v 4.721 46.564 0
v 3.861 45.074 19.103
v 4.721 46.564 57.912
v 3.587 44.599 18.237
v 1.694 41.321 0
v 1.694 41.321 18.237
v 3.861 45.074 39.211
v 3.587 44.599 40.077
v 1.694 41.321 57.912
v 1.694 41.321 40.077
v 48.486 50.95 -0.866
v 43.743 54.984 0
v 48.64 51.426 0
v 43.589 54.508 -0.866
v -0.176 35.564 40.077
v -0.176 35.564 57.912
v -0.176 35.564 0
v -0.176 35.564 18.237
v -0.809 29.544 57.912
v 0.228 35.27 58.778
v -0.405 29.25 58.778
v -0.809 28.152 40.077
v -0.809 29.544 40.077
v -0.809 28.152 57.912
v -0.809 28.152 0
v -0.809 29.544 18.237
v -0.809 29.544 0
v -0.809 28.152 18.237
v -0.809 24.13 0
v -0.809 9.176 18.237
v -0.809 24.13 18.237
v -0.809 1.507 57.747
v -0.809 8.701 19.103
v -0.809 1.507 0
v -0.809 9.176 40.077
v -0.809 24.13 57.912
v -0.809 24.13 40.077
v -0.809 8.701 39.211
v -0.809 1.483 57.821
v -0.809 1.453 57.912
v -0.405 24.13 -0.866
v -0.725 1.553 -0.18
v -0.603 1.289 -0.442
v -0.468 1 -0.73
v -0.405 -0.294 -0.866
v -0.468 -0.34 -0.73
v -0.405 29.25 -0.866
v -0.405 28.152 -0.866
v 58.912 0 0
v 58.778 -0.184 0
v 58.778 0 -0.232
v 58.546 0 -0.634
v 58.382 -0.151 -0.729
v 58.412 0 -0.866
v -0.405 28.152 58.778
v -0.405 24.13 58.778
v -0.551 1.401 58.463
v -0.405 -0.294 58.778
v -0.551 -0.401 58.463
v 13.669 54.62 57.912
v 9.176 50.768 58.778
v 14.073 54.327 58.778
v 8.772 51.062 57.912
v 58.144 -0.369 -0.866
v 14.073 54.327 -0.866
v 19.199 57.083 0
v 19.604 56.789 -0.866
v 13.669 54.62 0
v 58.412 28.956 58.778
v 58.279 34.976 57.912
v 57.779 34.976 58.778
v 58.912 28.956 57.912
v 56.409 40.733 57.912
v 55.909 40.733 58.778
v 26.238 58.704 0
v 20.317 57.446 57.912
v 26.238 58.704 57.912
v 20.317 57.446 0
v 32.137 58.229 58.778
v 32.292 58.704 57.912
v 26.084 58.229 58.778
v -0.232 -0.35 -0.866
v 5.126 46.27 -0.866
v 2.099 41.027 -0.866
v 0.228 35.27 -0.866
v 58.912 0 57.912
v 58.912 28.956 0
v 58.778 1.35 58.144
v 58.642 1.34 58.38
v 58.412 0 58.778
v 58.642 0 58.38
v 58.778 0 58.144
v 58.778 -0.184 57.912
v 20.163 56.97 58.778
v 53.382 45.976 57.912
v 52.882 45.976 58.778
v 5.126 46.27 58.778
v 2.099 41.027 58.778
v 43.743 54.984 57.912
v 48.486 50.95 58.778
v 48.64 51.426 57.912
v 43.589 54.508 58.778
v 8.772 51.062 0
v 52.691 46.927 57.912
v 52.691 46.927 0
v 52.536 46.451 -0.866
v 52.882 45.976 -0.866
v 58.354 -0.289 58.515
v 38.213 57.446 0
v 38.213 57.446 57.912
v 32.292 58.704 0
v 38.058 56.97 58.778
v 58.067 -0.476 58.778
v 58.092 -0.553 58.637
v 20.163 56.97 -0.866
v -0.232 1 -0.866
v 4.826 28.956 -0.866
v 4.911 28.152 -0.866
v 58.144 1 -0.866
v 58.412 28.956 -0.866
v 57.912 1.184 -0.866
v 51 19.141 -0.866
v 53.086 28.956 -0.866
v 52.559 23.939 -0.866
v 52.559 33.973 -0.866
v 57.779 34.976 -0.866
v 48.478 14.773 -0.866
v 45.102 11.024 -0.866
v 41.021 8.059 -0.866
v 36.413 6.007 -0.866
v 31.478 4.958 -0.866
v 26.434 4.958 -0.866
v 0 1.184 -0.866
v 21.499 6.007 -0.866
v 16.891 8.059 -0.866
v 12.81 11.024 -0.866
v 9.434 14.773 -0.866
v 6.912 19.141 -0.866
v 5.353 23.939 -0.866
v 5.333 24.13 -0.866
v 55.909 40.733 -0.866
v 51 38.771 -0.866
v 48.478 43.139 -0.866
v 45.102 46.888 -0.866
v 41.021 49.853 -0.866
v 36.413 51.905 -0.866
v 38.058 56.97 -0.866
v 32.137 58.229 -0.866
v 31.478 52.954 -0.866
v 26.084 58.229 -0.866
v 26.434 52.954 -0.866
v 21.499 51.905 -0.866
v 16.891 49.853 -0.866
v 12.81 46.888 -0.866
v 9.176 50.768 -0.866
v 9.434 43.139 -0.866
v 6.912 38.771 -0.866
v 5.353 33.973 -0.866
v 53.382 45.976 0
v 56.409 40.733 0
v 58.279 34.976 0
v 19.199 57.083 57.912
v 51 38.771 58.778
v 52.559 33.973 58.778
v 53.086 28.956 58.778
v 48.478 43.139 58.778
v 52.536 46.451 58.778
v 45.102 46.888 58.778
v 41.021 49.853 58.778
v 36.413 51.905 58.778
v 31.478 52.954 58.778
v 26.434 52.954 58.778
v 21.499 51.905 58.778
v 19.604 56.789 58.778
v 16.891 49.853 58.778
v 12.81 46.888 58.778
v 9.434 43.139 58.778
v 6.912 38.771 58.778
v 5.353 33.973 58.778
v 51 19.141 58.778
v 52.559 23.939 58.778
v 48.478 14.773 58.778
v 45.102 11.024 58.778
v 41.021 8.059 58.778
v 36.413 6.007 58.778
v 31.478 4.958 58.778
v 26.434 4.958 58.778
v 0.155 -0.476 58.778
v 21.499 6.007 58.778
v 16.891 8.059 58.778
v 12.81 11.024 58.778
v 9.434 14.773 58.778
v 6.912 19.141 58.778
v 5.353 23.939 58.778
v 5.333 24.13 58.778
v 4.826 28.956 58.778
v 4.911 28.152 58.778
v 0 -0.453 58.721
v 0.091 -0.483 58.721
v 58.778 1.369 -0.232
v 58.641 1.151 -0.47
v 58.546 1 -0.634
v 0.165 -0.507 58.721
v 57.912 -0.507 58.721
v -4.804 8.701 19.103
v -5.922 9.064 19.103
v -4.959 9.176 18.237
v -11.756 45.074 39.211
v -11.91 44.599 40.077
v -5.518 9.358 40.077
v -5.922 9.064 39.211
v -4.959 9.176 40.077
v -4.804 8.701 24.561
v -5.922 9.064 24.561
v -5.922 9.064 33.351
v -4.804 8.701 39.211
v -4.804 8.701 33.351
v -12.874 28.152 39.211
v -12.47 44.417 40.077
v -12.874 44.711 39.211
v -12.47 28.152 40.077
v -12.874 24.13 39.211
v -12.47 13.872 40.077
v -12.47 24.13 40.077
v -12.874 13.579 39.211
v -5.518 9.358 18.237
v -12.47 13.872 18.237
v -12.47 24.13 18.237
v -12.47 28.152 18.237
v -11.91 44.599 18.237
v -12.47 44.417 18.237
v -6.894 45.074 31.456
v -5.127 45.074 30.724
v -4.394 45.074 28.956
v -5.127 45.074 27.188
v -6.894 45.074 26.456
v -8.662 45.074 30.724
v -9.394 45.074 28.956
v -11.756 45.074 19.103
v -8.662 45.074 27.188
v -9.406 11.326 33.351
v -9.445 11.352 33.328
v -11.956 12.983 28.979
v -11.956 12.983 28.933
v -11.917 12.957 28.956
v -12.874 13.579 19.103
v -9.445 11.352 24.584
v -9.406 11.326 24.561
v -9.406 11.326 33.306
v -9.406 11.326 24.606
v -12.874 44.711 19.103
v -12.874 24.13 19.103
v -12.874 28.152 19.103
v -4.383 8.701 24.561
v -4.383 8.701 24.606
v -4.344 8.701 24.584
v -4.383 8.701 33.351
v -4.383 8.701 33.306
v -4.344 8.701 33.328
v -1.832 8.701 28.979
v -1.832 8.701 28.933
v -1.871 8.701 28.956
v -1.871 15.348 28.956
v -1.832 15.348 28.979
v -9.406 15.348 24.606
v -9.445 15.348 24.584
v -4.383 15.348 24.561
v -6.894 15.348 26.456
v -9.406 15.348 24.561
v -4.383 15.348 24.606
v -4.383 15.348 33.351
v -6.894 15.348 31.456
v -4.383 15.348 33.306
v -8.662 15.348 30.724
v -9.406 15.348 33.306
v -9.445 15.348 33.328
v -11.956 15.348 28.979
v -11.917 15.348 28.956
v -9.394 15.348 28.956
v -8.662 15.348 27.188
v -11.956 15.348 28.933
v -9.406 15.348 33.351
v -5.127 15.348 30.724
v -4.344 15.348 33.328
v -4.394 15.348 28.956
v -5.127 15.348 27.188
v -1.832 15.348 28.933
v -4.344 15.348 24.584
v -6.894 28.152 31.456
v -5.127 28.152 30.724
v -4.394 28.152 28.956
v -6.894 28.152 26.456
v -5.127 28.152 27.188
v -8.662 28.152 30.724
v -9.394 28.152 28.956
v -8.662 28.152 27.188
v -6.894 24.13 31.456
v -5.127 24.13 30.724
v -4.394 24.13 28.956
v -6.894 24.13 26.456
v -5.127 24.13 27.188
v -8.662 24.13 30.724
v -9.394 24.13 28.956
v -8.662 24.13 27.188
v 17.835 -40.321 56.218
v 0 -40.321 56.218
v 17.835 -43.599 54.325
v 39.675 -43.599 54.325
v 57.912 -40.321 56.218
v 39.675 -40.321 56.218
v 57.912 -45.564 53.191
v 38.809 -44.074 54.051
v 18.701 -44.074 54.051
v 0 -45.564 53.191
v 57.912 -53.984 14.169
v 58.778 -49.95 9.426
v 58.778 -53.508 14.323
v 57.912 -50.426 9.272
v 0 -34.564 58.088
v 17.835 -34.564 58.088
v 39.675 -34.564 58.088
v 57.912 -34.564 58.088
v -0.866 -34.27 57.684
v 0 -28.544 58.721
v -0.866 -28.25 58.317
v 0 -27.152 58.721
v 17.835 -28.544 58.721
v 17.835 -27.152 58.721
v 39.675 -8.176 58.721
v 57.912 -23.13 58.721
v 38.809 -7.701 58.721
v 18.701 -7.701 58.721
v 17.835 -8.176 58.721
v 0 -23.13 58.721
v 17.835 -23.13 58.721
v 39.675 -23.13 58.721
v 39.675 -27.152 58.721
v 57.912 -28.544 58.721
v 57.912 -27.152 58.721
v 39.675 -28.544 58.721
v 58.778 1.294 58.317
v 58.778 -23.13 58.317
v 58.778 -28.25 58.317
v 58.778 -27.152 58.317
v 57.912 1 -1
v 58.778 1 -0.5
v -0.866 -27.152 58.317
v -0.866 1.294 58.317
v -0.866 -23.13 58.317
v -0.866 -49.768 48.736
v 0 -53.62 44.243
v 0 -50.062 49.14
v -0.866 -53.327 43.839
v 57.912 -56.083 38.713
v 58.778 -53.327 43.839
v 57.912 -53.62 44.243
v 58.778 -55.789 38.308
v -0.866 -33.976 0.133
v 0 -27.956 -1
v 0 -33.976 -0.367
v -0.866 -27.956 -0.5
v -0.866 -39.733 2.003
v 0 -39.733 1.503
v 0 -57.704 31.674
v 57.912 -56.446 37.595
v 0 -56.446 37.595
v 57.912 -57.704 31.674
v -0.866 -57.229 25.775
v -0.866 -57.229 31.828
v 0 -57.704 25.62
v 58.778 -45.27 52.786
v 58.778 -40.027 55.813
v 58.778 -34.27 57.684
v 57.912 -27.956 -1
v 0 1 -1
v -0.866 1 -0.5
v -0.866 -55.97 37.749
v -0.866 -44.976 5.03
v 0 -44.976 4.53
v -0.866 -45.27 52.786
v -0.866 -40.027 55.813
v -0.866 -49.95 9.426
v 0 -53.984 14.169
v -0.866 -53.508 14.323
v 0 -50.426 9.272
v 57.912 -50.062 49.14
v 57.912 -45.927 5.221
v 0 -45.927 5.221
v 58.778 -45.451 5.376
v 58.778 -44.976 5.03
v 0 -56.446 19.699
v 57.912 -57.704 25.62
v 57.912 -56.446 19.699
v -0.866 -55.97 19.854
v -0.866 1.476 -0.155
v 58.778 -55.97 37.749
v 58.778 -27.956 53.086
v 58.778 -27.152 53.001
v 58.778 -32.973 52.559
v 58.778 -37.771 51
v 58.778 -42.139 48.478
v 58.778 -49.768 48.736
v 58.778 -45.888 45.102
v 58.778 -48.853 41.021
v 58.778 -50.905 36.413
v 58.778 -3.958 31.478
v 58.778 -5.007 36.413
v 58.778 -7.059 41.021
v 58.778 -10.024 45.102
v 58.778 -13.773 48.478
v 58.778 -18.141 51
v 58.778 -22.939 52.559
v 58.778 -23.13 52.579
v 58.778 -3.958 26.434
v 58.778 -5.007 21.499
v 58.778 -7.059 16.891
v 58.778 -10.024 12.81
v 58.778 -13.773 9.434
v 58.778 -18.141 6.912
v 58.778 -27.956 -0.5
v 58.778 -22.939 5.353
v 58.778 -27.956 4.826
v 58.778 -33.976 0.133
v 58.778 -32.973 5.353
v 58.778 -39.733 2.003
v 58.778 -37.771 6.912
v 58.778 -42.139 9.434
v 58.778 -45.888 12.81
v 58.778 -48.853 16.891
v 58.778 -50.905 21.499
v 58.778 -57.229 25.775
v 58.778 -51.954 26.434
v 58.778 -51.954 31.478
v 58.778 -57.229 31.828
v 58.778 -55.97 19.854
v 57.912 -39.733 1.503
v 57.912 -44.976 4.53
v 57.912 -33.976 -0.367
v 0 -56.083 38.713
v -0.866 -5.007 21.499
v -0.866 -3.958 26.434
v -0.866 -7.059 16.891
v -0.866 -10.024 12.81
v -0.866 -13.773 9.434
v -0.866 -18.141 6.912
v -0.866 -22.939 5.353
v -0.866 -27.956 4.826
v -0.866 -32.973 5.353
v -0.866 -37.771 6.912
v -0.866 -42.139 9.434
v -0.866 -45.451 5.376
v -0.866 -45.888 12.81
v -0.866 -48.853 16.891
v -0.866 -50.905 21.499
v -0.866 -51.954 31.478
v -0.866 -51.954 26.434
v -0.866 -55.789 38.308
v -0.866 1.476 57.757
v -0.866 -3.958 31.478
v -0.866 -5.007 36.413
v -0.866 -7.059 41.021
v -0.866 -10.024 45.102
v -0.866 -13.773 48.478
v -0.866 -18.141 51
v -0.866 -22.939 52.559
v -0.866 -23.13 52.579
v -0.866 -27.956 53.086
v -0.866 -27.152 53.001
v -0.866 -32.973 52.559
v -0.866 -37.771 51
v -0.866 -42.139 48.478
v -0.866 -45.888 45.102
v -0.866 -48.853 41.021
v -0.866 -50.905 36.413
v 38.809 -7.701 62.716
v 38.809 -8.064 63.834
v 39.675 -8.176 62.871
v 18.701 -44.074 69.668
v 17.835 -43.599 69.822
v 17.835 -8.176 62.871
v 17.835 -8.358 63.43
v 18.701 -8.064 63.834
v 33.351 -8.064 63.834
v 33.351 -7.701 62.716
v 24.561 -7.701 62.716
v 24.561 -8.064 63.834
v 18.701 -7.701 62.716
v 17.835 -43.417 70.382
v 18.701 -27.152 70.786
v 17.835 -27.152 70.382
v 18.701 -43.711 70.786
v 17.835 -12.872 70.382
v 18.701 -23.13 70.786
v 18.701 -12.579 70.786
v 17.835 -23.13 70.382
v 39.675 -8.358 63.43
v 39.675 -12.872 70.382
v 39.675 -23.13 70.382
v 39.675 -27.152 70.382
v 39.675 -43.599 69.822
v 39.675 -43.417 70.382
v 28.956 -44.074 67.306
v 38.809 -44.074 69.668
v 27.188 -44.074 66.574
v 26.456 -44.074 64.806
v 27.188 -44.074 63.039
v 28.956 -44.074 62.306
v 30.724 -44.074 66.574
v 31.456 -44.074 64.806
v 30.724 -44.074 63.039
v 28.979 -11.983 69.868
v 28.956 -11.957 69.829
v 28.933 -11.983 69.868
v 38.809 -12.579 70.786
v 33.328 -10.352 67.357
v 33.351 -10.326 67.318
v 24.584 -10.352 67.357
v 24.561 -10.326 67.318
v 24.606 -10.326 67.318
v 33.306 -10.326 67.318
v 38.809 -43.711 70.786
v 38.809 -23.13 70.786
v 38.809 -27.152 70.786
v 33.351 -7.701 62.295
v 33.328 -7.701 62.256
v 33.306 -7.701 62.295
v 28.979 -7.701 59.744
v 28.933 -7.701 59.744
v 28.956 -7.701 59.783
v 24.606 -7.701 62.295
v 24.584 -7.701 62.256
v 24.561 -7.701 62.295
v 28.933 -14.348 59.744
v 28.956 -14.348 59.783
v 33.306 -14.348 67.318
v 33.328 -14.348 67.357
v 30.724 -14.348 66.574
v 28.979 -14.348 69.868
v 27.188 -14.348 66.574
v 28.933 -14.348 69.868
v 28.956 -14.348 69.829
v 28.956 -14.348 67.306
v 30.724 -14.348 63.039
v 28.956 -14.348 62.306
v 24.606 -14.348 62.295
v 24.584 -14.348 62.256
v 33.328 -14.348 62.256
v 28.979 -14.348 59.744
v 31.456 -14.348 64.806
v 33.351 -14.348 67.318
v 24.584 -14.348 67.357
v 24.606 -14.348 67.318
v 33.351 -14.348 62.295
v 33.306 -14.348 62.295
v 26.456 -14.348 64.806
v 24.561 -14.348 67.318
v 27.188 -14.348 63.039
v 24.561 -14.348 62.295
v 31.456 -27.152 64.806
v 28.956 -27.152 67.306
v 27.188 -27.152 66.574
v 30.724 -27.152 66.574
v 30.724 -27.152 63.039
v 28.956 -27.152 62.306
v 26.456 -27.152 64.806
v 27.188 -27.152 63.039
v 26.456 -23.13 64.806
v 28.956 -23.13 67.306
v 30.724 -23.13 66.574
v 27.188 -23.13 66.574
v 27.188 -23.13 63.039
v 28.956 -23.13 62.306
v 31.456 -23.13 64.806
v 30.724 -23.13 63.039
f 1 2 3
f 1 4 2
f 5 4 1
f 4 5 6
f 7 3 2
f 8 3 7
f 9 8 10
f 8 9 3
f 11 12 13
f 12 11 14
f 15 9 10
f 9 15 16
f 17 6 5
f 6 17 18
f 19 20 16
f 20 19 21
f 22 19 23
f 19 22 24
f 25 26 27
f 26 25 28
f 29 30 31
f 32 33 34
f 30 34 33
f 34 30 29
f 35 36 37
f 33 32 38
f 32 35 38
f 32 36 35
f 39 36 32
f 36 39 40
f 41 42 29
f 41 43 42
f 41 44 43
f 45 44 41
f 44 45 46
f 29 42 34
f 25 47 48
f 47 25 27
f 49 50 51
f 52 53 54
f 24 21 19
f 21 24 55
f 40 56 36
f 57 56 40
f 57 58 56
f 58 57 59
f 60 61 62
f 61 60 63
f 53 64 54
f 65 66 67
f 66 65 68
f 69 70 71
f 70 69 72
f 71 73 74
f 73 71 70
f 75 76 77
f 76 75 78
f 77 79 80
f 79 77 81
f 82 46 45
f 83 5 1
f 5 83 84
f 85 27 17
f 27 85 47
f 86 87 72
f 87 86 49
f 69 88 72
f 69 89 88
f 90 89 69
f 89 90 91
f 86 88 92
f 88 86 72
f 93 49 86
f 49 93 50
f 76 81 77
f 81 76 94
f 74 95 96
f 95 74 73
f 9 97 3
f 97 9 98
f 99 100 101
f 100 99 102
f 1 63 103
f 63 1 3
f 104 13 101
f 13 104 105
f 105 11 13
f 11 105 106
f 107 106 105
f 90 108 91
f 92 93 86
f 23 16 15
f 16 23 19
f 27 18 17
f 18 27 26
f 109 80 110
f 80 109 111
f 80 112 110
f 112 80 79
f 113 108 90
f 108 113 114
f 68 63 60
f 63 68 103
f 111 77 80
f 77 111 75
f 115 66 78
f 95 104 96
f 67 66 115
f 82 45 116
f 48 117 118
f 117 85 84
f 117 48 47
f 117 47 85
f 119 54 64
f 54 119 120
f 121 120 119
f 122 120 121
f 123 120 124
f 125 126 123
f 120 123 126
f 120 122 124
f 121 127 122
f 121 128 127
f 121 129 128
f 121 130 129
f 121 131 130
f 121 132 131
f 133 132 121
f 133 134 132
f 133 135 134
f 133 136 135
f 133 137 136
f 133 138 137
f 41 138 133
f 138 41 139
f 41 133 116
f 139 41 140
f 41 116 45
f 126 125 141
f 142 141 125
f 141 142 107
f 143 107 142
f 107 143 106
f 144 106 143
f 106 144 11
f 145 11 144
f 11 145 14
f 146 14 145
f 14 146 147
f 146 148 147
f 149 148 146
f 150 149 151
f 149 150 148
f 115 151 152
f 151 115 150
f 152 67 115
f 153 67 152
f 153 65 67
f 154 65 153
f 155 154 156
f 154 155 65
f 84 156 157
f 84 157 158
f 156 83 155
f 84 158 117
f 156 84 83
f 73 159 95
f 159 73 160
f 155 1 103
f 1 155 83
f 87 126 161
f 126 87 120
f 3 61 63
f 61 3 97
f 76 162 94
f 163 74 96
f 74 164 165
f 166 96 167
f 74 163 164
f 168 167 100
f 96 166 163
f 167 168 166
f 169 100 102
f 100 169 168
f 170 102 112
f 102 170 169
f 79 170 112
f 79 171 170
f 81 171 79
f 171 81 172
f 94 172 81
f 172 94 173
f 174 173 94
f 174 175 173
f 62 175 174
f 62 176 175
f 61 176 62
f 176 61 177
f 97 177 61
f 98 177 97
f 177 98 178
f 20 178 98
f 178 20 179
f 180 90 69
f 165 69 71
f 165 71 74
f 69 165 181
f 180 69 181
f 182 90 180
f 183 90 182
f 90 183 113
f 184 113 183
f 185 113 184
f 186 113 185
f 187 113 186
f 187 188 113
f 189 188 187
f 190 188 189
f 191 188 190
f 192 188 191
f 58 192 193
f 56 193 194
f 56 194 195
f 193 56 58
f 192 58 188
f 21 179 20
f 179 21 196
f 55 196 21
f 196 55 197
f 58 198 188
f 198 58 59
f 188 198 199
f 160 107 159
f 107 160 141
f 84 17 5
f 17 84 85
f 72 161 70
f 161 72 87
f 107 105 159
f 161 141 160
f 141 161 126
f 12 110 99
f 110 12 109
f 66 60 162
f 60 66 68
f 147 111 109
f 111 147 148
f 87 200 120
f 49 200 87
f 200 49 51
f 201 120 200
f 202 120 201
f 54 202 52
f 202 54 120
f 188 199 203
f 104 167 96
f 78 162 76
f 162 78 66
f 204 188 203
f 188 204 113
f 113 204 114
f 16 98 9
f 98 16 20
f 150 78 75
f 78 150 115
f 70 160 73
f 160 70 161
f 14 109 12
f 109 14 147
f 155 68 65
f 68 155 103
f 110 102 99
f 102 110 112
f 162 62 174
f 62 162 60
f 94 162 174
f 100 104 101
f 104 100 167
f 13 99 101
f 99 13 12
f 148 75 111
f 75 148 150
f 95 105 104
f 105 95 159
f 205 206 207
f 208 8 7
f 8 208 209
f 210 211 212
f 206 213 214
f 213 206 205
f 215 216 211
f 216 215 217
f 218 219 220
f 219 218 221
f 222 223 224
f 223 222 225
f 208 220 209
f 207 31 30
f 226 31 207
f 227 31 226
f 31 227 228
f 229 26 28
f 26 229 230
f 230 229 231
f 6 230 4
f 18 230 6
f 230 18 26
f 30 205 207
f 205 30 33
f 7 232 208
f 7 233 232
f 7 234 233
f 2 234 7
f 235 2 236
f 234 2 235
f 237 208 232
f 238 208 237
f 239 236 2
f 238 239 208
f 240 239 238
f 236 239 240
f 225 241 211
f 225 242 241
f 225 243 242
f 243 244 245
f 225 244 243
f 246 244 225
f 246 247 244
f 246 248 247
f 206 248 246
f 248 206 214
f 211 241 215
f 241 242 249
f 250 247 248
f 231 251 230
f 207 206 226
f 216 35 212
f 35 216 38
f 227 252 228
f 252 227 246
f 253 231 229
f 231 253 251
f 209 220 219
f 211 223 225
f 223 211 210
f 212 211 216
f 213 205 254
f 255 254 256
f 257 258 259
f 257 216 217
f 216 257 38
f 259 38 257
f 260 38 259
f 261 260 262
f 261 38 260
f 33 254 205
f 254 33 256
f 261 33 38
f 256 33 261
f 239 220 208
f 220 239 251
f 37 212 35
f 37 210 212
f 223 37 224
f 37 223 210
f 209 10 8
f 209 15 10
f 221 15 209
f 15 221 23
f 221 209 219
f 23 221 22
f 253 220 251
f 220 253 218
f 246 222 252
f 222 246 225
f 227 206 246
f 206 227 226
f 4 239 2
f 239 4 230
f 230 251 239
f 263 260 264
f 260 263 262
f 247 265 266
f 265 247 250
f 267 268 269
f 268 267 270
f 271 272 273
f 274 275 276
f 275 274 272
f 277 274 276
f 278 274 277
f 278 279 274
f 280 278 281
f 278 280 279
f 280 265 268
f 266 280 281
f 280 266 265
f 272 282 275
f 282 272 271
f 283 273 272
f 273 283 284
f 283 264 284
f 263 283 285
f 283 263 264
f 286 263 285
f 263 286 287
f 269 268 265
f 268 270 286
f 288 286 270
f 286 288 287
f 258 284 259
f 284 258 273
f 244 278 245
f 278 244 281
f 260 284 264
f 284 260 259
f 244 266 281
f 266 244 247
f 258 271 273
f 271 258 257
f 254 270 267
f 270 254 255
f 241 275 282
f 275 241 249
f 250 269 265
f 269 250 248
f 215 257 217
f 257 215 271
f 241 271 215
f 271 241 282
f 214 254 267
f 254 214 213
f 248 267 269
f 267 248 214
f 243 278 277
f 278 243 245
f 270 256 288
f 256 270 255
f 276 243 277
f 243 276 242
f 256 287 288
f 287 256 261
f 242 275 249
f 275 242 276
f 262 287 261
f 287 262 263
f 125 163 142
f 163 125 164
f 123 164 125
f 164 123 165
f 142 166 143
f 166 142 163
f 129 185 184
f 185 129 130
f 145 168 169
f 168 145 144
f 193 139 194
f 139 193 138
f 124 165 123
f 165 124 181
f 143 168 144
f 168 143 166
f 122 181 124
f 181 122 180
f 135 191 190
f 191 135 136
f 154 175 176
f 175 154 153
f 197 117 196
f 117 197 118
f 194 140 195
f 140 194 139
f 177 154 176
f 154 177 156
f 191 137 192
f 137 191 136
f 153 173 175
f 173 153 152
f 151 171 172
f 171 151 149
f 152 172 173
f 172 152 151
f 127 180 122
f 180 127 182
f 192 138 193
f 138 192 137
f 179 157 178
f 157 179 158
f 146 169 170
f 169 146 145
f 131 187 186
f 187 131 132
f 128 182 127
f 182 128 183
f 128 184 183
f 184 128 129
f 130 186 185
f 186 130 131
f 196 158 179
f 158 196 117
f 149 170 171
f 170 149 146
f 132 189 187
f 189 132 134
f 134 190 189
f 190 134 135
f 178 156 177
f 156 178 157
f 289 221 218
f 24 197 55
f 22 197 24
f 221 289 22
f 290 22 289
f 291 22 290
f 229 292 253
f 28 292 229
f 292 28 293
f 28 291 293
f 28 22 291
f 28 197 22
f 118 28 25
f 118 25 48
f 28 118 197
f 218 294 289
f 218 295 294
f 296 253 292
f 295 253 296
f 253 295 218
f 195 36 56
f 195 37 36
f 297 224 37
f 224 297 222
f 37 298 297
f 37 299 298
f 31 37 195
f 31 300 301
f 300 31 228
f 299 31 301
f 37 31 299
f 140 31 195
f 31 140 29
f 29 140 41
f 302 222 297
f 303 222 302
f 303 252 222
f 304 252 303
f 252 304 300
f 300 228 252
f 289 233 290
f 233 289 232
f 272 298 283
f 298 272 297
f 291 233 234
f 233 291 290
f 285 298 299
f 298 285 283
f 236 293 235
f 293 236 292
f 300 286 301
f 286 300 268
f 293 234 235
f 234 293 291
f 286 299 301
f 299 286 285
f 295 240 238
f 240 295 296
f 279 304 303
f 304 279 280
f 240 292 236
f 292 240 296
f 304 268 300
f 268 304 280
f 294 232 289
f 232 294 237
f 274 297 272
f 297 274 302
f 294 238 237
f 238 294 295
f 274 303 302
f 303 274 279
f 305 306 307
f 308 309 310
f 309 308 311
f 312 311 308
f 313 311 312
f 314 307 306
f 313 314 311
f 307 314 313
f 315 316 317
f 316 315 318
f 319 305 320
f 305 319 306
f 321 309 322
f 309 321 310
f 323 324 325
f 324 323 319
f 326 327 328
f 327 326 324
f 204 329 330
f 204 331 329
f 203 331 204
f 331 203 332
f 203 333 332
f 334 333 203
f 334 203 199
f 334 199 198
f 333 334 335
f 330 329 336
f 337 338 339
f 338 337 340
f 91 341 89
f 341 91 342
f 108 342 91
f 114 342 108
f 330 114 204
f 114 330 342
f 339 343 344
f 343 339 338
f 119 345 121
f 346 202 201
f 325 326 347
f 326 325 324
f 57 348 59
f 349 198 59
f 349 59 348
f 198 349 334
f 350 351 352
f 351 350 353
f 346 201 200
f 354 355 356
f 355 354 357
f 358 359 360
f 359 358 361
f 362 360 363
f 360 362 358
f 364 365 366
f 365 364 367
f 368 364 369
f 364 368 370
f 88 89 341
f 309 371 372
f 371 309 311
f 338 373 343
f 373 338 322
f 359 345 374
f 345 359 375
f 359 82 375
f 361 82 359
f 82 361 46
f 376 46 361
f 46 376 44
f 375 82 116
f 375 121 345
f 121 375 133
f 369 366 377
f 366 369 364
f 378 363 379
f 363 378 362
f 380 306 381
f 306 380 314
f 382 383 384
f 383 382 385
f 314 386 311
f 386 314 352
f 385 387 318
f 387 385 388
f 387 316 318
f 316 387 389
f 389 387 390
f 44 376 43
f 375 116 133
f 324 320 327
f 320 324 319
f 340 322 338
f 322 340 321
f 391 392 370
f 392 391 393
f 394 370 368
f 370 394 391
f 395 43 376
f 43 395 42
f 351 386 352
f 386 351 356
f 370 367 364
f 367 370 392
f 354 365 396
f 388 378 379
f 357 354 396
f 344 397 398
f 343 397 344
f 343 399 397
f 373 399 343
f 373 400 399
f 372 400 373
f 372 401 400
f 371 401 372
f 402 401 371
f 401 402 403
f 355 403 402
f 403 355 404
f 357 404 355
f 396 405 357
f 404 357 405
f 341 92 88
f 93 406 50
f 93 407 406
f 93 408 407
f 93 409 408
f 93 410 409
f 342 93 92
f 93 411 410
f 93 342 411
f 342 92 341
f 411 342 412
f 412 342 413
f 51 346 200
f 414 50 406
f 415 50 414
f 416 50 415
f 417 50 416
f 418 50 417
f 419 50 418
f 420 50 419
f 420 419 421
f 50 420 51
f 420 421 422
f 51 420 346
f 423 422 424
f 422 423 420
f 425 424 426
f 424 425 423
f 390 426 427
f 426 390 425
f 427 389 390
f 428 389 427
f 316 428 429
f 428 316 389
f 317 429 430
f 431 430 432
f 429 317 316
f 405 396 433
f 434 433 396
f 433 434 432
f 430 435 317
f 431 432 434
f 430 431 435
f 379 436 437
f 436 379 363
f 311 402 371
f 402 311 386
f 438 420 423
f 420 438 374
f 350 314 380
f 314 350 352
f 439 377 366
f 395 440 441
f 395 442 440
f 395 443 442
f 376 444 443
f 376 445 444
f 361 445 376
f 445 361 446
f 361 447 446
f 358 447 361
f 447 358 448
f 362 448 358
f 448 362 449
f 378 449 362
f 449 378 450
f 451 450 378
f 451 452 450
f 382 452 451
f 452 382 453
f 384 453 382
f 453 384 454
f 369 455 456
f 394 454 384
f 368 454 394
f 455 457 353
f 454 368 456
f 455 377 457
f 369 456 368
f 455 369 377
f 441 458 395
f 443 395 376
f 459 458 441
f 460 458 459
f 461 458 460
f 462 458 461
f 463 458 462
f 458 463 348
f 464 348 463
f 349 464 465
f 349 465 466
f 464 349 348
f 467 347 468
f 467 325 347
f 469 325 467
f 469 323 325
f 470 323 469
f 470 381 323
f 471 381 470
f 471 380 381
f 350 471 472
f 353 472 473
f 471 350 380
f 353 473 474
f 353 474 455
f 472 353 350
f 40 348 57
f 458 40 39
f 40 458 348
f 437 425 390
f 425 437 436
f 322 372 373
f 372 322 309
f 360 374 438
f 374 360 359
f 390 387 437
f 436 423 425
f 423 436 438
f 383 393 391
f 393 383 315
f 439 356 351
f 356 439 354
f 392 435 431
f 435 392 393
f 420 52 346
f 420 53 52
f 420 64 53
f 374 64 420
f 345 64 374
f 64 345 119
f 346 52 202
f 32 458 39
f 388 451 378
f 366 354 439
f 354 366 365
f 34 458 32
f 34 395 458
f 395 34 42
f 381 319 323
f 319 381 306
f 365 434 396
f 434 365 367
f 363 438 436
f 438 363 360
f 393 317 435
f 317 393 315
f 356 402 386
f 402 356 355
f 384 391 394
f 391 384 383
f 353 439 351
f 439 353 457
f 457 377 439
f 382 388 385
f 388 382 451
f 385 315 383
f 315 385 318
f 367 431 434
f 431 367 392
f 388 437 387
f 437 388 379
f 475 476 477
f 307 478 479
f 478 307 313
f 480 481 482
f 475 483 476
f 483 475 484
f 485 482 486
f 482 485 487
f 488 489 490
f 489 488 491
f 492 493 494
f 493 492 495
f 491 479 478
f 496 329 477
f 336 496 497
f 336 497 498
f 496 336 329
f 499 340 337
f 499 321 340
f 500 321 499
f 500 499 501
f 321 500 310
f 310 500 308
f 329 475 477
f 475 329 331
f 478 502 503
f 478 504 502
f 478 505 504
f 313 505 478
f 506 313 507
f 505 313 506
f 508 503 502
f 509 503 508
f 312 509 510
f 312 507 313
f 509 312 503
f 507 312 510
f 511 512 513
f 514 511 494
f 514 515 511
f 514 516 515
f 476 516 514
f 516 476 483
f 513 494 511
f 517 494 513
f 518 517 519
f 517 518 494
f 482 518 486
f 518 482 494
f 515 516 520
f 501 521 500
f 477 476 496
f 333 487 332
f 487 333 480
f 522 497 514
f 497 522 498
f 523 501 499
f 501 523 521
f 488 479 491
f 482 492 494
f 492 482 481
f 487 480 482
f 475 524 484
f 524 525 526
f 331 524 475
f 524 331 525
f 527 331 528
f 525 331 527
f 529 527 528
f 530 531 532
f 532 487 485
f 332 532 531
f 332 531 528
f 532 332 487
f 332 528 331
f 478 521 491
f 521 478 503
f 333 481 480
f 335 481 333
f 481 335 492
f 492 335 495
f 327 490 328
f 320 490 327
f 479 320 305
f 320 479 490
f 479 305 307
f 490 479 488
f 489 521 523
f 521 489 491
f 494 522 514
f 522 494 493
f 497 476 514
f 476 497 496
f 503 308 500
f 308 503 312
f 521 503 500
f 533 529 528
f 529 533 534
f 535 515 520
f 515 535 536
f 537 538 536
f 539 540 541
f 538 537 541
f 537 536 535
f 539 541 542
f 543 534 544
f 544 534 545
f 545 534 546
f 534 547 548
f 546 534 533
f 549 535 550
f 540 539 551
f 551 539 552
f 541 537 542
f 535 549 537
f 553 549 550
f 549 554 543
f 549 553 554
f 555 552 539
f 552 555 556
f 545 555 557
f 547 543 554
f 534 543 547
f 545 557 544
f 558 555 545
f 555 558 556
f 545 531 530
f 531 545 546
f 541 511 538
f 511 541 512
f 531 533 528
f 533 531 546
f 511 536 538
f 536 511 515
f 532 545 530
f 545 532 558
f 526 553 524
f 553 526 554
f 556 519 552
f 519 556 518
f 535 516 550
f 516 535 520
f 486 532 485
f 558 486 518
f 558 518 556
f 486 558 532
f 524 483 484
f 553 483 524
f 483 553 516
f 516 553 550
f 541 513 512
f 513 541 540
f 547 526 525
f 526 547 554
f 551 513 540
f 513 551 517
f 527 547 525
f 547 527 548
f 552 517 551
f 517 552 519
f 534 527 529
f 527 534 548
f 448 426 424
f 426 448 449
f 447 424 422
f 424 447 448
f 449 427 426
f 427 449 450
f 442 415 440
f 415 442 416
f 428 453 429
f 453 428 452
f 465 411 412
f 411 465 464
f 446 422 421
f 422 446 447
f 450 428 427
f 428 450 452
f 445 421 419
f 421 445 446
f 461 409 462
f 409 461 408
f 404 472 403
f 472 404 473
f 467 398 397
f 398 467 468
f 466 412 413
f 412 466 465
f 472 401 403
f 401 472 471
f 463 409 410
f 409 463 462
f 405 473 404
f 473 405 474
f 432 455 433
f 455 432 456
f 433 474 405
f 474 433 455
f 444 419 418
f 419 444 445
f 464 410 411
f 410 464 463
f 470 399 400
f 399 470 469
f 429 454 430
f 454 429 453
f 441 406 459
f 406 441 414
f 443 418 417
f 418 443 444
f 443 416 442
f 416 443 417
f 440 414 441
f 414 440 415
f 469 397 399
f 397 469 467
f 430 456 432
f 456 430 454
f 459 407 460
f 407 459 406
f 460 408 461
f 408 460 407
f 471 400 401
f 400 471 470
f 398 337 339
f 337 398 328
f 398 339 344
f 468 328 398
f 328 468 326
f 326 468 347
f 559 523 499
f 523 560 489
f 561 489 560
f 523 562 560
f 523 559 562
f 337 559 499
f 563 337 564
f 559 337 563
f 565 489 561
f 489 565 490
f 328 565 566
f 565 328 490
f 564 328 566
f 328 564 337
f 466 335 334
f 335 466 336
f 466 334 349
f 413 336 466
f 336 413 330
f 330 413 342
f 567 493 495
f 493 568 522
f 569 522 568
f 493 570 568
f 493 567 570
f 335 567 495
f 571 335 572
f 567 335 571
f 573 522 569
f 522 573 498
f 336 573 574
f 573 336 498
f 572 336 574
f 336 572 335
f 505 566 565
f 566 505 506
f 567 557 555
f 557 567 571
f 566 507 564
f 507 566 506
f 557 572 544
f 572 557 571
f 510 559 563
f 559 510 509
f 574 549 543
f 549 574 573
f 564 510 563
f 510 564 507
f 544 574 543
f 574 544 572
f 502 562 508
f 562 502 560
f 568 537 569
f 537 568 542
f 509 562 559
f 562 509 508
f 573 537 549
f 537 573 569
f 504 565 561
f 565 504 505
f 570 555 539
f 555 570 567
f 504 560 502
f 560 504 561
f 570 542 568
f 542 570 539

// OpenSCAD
// [FL_INDEX: keywords="openscad, 3d_parametric, Parametric_Object__Universal_Rack-Clamp, csg_solid" | COT="Parametric OpenSCAD design from 3DCodeverse"]
// Title: Parametric Object: Universal Rack-Clamp

//M. Haris Usmani
//http://harisusmani.com

//All Units are in mm, Import as STL with Unit=mm

/* [Main Settings] */
//Radius of Pipe in Inches (Schedule 40)
R=1.9; //[2.375:2"PVC,1.9:1-1/2"PVC,1.660:1-1/4"PVC,1.315:1"PVC]

//Space for Tightening
T=3; //[0:5]

//Nut Size
M=5; //[4,5,6]

/////////////////////////////////////////////////////////////////////////////
R_mm=R*25.4; //Converted to mm!
//Strength of Clamp (Fixed)
S=1.2; // [1.2] Determines Strength of Clamp in Percentage-FIXED!

/////////////////////////////////////////////////////////////////////////////
//Hexagonal Module from shapes.scad, http://svn.clifford.at/openscad/trunk/libraries/shapes.scad by Catarina Mota
module hexagon(size, height) {
  boxWidth = size/1.75;
  for (r = [-60, 0, 60]) rotate([0,0,r]) cube([boxWidth, size, height], true);
}
/////////////////////////////////////////////////////////////////////////////

//Pipe Model for Visualization
//translate([R_mm*S/2,R_mm*S/2,-R_mm*6]) cylinder(R_mm*10,R_mm/2,R_mm/2);

union()//Main Duplication
{

difference() //Pipe Hole
{
union()
{
minkowski() //Fillet
{
	union()
	{
		cube([R_mm*S,R_mm/2*S, R_mm*S]); //Main Body
		translate([R_mm*S/2,R_mm*S/2,0]) cylinder(R_mm*S,R_mm*S/2,R_mm*S/2); //Curved Edge
	}
	sphere([R_mm/2,R_mm,R_mm*5/12]); //Fillet Object
}

minkowski() //Fillet
{
	difference() //Hard Chamfer
	{
		translate([-R_mm/4,R_mm/5,(R_mm/2)-(R_mm*5/48)]) cube([R_mm/2,R_mm/1.4,R_mm*5/12]);
		translate([-R_mm,-R_mm*7/17,(R_mm/2)-(R_mm*5/24)]) rotate([0,0,-33]) cube([R_mm/2,R_mm,2*R_mm*5/12]);
	}
	sphere([R_mm/2,R_mm,R_mm*5/12]); //Fillet Object
}
}
	union()
	{
		translate([R_mm*S/2,R_mm*S/2,-R_mm*6]) cylinder(R_mm*10,R_mm/2,R_mm/2);//Pipe
		translate([-R_mm,R_mm*S*5/12,-R_mm]) cube([R_mm*2,R_mm/(15-T),R_mm*4]);//Tightning Space
		translate([-R_mm/7,R_mm*2,(R_mm*S/2)]) rotate([90,0,0]) cylinder((R_mm*4),M/2,M/2); //Screw Space
		if (M==4) translate([-R_mm/7,-R_mm*0.2,(R_mm*S/2)]) rotate([90,0,0]) hexagon(7.66,50); //NUTS
		if (M==5) translate([-R_mm/7,-R_mm*0.2,(R_mm*S/2)]) rotate([90,0,0]) hexagon(8.79,50);
		if (M==6) translate([-R_mm/7,-R_mm*0.2,(R_mm*S/2)]) rotate([90,0,0]) hexagon(11.05,50);
	}
} //Single Side ENDS

}

{

translate([R_mm*S,1,R_mm*S]) rotate([180,90,0]) //Main Translation

//COPY SIDE HERE
difference() //Pipe Hole
{
union()
{
minkowski() //Fillet
{
	union()
	{
		cube([R_mm*S,R_mm/2*S, R_mm*S]); //Main Body
		translate([R_mm*S/2,R_mm*S/2,0]) cylinder(R_mm*S,R_mm*S/2,R_mm*S/2); //Curved Edge
	}
	sphere([R_mm/2,R_mm,R_mm*5/12]); //Fillet Object
}

minkowski() //Fillet
{
	difference() //Hard Chamfer
	{
		translate([-R_mm/4,R_mm/5,(R_mm/2)-(R_mm*5/48)]) cube([R_mm/2,R_mm/1.4,R_mm*5/12]);
		translate([-R_mm,-R_mm*7/17,(R_mm/2)-(R_mm*5/24)]) rotate([0,0,-33]) cube([R_mm/2,R_mm,2*R_mm*5/12]);
	}
	sphere([R_mm/2,R_mm,R_mm*5/12]); //Fillet Object
}
}
	union()
	{
		translate([R_mm*S/2,R_mm*S/2,-R_mm*6]) cylinder(R_mm*10,R_mm/2,R_mm/2);//Pipe
		translate([-R_mm,R_mm*S*5/12,-R_mm]) cube([R_mm*2,R_mm/(15-T),R_mm*4]);//Tightning Space
		translate([-R_mm/7,R_mm*2,(R_mm*S/2)]) rotate([90,0,0]) cylinder((R_mm*4),M/2,M/2); //Screw Space
		if (M==4) translate([-R_mm/7,-R_mm*0.2,(R_mm*S/2)]) rotate([90,0,0]) hexagon(7.66,50); //NUTS
		if (M==5) translate([-R_mm/7,-R_mm*0.2,(R_mm*S/2)]) rotate([90,0,0]) hexagon(8.79,50);
		if (M==6) translate([-R_mm/7,-R_mm*0.2,(R_mm*S/2)]) rotate([90,0,0]) hexagon(11.05,50);
	}
}
///////////////
}

//preview[view: north, tilt: top];
